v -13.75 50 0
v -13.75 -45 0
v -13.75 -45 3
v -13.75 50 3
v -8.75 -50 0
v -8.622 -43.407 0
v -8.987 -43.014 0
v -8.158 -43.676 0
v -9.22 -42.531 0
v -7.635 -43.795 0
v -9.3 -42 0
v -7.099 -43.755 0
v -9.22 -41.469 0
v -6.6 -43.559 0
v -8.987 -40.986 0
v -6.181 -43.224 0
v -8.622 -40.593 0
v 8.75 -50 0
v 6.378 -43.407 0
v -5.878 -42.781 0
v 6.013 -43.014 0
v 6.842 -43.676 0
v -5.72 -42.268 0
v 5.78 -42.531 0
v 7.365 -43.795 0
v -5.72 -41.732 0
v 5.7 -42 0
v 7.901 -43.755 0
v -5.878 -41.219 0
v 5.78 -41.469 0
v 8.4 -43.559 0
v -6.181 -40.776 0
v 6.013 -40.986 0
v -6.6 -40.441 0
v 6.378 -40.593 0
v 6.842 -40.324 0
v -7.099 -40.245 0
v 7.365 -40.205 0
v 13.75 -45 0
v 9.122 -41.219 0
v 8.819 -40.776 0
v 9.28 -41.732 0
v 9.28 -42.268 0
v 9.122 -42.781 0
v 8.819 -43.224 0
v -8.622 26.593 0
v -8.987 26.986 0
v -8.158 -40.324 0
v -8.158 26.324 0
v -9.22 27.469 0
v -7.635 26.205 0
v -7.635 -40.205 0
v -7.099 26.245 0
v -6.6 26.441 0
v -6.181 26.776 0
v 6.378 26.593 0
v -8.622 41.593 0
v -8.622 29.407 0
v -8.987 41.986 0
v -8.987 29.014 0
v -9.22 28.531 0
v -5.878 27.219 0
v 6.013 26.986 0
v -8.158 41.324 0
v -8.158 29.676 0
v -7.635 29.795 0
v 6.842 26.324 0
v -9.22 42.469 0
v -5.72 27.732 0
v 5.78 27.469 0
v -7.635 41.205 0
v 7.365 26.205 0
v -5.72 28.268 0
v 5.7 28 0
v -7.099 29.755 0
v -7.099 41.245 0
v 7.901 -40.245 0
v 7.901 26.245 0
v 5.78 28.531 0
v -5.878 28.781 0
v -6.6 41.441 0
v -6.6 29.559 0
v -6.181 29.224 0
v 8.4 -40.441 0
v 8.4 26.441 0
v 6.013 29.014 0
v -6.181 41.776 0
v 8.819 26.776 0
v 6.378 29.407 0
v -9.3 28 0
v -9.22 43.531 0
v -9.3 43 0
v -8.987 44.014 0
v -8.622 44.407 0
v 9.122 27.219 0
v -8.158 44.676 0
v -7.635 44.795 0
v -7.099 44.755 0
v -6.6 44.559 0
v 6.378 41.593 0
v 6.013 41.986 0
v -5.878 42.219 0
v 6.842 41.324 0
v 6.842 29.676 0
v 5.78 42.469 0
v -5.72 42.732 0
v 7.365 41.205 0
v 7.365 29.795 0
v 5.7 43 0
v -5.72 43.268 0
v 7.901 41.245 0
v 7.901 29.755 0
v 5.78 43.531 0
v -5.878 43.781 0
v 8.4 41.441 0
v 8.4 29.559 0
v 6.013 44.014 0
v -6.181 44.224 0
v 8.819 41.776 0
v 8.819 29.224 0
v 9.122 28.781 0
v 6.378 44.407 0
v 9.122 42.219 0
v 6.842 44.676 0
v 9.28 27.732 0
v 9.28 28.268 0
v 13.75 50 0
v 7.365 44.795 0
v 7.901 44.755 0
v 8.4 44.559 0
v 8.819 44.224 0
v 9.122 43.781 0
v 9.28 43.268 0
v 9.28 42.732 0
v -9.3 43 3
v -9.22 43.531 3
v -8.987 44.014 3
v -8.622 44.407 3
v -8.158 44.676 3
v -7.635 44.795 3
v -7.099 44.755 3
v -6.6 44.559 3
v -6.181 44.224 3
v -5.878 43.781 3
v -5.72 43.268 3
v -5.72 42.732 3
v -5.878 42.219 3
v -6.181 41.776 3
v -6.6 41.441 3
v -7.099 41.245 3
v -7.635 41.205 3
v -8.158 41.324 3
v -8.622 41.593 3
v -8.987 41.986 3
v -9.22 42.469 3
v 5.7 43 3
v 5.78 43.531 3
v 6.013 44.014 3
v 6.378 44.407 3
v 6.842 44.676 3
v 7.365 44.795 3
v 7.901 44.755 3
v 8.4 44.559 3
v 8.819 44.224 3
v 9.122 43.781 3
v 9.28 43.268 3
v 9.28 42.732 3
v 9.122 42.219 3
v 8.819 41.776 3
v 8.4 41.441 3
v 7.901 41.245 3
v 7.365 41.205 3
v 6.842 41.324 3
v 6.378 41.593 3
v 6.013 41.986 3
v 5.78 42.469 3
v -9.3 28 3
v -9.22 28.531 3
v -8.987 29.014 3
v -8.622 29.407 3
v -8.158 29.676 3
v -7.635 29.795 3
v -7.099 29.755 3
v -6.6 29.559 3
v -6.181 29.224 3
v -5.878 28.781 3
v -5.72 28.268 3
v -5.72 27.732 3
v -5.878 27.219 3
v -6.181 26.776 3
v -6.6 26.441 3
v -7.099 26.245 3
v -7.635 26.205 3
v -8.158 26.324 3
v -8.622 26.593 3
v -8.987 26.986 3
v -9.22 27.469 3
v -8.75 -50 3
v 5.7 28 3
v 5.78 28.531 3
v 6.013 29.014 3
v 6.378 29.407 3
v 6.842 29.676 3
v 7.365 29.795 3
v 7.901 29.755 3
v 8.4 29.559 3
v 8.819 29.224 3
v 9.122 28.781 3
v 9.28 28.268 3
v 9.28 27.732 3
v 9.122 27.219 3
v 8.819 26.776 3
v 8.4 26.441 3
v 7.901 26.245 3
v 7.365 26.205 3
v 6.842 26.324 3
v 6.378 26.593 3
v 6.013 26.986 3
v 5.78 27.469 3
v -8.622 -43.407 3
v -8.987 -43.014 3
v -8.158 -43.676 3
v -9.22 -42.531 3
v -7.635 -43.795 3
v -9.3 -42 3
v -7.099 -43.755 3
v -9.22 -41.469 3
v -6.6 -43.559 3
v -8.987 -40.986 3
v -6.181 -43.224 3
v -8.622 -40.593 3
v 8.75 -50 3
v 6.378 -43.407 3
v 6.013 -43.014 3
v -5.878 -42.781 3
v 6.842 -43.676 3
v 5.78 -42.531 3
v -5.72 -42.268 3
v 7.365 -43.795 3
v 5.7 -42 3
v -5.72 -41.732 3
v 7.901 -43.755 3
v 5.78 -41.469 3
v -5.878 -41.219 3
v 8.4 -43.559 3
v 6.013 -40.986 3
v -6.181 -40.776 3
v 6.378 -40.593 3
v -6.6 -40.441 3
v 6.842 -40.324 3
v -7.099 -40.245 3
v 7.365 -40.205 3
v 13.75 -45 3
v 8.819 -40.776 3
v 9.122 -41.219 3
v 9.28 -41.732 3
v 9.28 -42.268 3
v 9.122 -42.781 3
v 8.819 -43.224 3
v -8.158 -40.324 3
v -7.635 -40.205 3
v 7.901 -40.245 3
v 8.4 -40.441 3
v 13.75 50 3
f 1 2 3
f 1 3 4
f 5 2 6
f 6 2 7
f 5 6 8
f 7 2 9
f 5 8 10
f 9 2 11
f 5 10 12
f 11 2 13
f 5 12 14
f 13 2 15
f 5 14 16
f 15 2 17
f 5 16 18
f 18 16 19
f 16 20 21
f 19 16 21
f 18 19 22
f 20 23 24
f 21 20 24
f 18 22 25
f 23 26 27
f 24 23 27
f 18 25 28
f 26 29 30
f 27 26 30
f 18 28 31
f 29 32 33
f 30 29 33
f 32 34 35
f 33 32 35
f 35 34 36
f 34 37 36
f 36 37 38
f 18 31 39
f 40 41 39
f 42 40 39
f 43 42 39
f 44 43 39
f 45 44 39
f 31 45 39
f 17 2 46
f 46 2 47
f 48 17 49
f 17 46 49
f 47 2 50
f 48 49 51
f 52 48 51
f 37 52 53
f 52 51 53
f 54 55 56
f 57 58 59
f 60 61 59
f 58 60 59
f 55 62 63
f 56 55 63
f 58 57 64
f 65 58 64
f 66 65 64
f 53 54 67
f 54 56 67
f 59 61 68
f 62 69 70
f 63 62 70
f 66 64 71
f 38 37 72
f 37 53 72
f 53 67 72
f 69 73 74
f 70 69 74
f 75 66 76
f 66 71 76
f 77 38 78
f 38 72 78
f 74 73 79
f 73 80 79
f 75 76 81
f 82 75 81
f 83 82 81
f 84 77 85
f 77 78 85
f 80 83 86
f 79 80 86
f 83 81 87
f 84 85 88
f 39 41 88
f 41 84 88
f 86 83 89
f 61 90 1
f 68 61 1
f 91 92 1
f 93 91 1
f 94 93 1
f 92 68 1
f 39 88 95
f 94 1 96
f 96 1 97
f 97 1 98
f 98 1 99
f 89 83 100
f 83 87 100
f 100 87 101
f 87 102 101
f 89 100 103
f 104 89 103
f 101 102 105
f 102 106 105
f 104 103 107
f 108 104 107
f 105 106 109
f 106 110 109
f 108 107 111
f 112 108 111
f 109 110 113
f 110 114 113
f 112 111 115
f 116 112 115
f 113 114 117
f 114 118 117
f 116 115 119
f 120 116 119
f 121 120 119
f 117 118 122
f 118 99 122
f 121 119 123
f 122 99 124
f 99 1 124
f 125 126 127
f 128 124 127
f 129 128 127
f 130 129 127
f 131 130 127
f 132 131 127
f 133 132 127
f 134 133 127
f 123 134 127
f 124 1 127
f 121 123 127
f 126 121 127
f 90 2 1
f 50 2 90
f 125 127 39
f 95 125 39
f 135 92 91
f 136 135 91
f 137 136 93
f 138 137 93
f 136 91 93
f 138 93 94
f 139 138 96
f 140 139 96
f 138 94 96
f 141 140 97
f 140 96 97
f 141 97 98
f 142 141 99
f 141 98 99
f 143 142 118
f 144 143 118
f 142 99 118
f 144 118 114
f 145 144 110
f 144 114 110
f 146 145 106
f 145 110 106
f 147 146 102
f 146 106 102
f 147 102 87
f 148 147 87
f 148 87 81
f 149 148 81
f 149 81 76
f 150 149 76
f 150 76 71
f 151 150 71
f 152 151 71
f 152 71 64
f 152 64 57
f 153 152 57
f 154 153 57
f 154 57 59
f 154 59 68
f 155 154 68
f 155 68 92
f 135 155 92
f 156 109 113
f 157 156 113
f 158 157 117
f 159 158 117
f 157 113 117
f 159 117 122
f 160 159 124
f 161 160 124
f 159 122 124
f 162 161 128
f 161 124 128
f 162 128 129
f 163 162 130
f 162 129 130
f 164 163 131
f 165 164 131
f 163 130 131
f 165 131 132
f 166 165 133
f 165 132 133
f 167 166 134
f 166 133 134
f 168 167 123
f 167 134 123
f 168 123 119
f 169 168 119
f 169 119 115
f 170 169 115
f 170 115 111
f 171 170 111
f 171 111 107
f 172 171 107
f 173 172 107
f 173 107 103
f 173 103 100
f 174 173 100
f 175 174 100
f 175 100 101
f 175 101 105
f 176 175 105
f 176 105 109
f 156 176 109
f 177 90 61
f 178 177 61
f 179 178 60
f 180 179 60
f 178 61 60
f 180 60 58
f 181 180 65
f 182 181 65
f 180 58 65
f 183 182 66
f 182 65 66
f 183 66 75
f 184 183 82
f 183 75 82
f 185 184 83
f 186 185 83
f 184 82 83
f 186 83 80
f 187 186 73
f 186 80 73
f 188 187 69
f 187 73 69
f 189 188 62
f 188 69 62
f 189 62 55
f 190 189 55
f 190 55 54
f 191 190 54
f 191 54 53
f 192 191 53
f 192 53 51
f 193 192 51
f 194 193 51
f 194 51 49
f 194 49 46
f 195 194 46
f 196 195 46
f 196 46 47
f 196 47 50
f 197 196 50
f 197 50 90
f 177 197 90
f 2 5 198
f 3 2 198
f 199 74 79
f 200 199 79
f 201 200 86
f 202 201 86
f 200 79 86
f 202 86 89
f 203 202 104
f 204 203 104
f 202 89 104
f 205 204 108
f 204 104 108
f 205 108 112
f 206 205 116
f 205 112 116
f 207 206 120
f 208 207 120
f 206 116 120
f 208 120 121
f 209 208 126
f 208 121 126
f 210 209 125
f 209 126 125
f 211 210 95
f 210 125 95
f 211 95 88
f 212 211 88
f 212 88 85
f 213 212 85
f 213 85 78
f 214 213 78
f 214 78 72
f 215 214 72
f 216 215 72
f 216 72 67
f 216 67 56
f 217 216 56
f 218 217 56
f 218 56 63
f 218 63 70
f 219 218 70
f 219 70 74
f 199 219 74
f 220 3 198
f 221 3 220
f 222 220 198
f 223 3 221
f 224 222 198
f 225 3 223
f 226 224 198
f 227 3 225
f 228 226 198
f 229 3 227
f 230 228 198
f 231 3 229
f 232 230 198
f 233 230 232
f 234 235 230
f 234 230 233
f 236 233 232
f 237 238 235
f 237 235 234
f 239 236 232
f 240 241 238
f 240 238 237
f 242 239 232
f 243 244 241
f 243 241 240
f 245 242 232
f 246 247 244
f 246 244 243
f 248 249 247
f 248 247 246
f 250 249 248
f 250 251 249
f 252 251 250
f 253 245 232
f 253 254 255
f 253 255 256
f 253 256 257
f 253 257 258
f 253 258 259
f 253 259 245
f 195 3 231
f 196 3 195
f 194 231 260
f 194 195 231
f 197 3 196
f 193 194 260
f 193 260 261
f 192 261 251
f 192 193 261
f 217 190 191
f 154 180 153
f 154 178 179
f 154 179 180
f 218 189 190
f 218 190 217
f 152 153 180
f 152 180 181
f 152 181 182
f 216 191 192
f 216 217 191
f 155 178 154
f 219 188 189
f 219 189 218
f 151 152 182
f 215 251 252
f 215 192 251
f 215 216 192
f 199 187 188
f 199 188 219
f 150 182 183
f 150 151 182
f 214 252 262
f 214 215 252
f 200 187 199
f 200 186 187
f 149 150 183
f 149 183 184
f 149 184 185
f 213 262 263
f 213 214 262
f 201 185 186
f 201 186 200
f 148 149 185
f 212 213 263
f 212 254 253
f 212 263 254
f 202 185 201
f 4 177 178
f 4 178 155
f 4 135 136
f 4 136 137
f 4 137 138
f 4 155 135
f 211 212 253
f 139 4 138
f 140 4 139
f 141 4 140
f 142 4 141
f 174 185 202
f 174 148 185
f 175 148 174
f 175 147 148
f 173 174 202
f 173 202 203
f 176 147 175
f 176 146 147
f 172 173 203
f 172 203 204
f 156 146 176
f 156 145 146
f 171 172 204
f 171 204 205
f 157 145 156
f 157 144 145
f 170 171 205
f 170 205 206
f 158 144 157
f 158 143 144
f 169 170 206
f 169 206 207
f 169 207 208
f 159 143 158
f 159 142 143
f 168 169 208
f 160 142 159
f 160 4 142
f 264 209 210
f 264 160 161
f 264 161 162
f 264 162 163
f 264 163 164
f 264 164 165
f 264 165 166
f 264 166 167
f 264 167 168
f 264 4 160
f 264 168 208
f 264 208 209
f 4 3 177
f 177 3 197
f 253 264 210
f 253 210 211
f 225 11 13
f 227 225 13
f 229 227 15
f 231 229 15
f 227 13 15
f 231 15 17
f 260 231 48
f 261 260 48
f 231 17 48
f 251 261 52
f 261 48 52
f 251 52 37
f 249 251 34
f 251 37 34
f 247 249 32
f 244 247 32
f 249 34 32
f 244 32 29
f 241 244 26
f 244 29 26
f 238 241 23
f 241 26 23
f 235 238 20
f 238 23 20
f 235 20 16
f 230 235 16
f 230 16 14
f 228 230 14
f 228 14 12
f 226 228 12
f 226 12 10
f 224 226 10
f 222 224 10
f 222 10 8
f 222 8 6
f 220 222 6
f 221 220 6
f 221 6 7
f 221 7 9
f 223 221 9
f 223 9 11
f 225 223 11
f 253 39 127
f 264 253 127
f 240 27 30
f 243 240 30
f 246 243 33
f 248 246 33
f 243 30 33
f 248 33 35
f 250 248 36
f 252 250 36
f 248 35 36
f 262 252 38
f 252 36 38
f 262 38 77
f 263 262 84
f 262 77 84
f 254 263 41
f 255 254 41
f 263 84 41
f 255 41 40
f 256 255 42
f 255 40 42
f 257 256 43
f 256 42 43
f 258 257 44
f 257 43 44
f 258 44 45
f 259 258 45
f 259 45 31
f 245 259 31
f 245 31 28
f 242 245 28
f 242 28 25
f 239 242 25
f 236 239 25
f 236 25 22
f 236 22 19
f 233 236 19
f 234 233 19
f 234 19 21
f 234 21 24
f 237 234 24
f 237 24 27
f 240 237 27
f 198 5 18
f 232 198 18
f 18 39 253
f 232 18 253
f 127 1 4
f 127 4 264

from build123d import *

# Parameters (mm, degrees)
SKETCH1_W                = 27.5
SKETCH1_H                = 100
BOSS_EXTRUDE1_DEPTH      = 3
M3_CLEARANCE_HOLE1_D     = 3.6
M3_CLEARANCE_HOLE1_DEPTH = 30
M3_CLEARANCE_HOLE1_TIP   = 1.081549114
CHAMFER1_SIZE            = 5


with BuildPart() as part:
    # Sketch1 → Boss-Extrude1 (new body)
    with BuildSketch(Plane.XY):
        Rectangle(SKETCH1_W, SKETCH1_H)
    extrude(amount=BOSS_EXTRUDE1_DEPTH)

    # M3 Clearance Hole1
    with Locations(Plane.XY.offset(3)):
        with Locations((-7.5, 43), (7.5, 43), (7.5, 28), (-7.5, 28), (-7.5, -42), (7.5, -42)):
            Hole(M3_CLEARANCE_HOLE1_D / 2, depth=M3_CLEARANCE_HOLE1_DEPTH)
            with Locations((0, 0, -(M3_CLEARANCE_HOLE1_DEPTH + M3_CLEARANCE_HOLE1_TIP / 2))):  # 118° drill point
                Cone(0, M3_CLEARANCE_HOLE1_D / 2, M3_CLEARANCE_HOLE1_TIP, mode=Mode.SUBTRACT)

    # Chamfer1
    chamfer1_edges = [part.edges().sort_by_distance(p)[0] for p in [
        (13.75, -50, 1.5),
        (-13.75, -50, 1.5),
    ]]
    chamfer(chamfer1_edges, length=CHAMFER1_SIZE)


solid = part.part
